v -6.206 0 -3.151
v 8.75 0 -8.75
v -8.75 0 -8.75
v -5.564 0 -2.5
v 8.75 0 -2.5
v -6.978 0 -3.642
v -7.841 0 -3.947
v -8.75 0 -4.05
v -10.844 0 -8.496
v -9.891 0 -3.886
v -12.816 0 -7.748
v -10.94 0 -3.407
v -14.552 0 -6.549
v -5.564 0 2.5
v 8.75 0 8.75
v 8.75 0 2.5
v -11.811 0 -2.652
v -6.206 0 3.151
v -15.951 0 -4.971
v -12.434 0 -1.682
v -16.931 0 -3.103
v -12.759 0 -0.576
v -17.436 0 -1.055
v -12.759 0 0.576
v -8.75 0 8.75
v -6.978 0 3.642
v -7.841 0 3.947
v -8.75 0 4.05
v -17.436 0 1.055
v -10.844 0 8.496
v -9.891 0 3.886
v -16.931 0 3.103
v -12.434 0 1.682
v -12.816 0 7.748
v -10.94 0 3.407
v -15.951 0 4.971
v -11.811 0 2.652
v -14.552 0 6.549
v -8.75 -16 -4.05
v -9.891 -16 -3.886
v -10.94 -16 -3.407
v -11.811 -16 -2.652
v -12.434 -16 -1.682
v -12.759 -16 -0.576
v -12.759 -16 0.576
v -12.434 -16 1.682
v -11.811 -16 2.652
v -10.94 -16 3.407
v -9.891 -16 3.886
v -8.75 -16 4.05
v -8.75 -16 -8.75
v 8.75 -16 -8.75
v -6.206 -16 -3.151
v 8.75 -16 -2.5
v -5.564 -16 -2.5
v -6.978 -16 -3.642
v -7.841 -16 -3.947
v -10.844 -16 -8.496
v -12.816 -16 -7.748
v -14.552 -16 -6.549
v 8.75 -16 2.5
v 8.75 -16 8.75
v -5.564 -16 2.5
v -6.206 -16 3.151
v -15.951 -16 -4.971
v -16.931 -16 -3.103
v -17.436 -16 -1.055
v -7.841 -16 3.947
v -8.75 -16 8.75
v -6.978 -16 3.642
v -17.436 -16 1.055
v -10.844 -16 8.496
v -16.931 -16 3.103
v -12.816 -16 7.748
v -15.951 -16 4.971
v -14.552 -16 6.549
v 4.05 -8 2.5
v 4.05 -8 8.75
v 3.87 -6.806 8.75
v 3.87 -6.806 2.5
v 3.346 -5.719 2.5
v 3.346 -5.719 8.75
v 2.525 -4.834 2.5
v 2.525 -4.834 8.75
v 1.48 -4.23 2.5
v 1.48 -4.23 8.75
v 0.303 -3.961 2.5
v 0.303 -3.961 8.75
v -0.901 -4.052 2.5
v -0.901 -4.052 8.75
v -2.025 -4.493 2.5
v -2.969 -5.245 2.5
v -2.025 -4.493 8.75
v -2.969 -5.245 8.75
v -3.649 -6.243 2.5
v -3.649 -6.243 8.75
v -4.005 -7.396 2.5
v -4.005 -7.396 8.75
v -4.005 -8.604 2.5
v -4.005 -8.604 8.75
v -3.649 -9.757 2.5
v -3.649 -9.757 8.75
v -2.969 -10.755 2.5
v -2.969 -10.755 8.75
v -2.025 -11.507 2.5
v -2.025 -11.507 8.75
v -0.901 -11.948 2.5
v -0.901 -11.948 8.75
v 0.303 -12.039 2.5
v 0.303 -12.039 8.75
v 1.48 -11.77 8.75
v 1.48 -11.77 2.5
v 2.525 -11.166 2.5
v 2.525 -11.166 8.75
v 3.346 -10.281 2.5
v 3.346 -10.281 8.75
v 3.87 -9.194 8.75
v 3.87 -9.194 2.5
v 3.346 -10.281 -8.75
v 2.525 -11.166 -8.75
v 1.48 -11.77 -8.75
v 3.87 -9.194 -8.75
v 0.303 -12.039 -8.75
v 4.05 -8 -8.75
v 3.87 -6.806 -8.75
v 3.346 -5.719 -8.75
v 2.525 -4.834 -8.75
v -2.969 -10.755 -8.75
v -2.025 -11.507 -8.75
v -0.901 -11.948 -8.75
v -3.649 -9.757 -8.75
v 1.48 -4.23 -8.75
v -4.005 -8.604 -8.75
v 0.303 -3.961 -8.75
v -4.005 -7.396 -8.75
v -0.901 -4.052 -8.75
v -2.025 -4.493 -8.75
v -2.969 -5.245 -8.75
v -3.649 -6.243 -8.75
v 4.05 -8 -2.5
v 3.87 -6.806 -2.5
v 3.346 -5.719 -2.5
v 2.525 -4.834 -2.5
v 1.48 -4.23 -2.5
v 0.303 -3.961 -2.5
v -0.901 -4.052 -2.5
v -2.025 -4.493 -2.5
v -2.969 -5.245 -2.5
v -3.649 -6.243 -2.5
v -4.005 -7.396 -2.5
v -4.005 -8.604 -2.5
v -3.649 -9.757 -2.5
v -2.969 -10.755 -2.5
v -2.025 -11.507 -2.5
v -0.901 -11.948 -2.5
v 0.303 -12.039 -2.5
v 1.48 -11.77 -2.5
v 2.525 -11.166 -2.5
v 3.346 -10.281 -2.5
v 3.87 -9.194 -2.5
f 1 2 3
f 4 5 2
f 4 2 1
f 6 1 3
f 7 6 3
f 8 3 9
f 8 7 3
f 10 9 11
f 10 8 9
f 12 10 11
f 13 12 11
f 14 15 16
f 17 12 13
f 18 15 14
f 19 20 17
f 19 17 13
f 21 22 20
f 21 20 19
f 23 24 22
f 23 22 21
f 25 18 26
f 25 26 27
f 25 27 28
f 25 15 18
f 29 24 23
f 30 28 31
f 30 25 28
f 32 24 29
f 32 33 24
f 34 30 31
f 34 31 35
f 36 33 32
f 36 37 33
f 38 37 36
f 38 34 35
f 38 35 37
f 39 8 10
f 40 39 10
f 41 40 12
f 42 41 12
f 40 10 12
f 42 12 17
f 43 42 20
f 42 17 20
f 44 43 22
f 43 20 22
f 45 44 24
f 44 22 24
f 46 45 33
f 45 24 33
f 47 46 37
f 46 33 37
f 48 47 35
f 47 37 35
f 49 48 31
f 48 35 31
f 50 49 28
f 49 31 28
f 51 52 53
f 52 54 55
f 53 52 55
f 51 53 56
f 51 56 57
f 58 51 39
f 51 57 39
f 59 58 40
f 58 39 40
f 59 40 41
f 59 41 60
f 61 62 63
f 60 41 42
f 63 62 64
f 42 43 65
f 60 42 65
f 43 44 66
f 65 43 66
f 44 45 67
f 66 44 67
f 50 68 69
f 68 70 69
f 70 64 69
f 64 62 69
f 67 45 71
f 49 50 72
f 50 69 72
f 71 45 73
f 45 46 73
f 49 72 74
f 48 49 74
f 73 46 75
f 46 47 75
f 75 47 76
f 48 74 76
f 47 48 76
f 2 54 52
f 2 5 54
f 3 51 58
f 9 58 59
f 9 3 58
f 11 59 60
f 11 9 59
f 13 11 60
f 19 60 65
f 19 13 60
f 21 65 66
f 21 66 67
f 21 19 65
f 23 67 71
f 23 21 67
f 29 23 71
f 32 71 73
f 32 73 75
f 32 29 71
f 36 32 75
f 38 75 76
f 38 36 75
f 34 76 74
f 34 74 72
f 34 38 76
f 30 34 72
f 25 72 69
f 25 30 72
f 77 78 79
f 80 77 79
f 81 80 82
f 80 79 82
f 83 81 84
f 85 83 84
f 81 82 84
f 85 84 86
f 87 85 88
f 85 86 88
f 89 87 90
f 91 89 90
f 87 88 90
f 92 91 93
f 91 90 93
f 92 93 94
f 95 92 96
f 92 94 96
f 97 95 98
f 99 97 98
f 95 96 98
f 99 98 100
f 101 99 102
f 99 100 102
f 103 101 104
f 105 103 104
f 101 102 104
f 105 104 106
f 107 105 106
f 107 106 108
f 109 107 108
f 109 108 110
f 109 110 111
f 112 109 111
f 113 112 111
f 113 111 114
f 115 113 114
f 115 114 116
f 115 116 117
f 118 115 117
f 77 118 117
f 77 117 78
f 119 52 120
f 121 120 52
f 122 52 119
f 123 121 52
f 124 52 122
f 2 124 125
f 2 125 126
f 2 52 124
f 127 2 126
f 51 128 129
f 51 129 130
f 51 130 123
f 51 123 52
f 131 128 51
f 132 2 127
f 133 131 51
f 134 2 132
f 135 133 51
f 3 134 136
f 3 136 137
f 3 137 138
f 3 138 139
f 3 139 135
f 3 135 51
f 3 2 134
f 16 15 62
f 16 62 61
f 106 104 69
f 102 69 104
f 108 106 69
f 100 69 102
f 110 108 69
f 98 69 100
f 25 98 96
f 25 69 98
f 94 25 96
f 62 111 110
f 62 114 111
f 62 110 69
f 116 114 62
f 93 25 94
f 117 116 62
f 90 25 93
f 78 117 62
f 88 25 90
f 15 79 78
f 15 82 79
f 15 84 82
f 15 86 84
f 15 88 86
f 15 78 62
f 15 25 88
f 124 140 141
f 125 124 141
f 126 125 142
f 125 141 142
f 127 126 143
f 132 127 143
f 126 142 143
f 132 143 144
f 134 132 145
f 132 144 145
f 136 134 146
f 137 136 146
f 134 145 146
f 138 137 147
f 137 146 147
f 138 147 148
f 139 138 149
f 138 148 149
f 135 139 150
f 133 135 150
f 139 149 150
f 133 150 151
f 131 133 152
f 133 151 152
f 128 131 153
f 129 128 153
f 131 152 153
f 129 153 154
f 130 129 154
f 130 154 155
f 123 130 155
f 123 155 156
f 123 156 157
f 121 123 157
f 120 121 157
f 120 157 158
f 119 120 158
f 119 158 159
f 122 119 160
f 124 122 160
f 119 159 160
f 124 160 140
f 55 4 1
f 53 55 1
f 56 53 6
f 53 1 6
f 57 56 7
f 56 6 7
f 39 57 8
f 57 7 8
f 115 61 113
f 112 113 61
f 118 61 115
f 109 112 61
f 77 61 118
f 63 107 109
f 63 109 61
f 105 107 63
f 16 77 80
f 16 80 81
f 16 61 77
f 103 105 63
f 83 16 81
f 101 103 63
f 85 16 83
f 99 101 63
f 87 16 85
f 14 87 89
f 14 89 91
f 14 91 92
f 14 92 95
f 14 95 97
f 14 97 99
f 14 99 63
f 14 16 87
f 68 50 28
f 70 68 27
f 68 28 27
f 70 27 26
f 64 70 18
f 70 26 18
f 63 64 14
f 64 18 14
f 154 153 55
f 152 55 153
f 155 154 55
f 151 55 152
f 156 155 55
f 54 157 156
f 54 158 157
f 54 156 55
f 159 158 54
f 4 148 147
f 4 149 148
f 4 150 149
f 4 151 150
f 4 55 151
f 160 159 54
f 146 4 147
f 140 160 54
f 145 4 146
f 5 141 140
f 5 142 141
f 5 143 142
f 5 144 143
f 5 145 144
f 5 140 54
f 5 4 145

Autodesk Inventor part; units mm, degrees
ref_plane "YZ Plane" through (0, 0, 0) normal (1, 0, 0) x (0, 1, 0)
ref_plane "XZ Plane" through (0, 0, 0) normal (0, 1, 0) x (-1, 0, 0)
ref_plane "XY Plane" through (0, 0, 0) normal (0, 0, 1) x (1, 0, 0)
sketch "Sketch1" plane through (0, 0, 0) normal (0, 1, 0) x (-1, 0, 0)
  point P0 (0, 0)
sketch "Sketch2" plane through (0, 0, 0) normal (0, 1, 0) x (-1, 0, 0)
  point P0 (0, 0)
sketch "Sketch3" plane through (0, 0, 0) normal (0, 1, 0) x (-1, 0, 0)
  line L0 (0, 0) -> (0, -8.75) construction
  line L1 (0, 0) -> (0, 8.75) construction
  line L2 (8.75, 8.75) -> (-8.75, 8.75)
  line L3 (-8.75, 8.75) -> (-8.75, -8.75)
  line L4 (-8.75, -8.75) -> (8.75, -8.75)
  line L5 (8.75, -8.75) -> (8.75, 8.75)
  circle A0 centre (8.75, 0) radius 8.75
  circle A1 centre (8.75, 0) radius 4.05
  line L6 (0, 0) -> (4.05, 0) construction
  dimension "d0" = 8.75
  dimension "d1" = 8.75
  dimension "d2" = 17.5
  dimension "d3" = 17.5
  dimension "d7" = 8.1
  dimension "d9" = 4.05
sketch "Sketch4" plane through (0, 0, 0) normal (0, 1, 0) x (-1, 0, 0)
  point P0 (0, 0)
sketch "Sketch5" plane through (0, 0, 0) normal (0, 1, 0) x (-1, 0, 0)
  point P0 (0, 0)
extrude "Extrusion2" add sketch "Sketch3" against normal blind 16 contours A0 L4 L3 L2 | A0 L5 A1 | L5 A1 A0 | L5 A1 picked at (7.639, -0.7669)
sketch "Sketch6" plane through (0, 0, 0) normal (0, 1, 0) x (1, 0, 0)
  line L0 (-8.75, 4.05) -> (-8.75, -4.05) projected
  circle A0 centre (-8.75, 0) radius 4.05
  point P0 (0, 0)
sketch "Sketch7" plane through (0, 0, 0) normal (0, 1, 0) x (1, 0, 0)
  line L0 (-8.75, 4.05) -> (-8.75, -4.05) construction
  circle A0 centre (-8.75, 0) radius 4.05 construction
  arc A1 (-8.75, 4.05) -> (-8.75, -4.05) centre (-8.75, 0) ccw construction
  arc A2 (-8.75, 8.75) -> (-8.75, -8.75) centre (-8.75, 0) ccw construction
  point P0 (0, 0)
  dimension "d12" = 8.1
extrude "Extrusion3" cut sketch "Sketch6" against normal blind 16
sketch "Sketch8" plane through (-8.75, 0, 8.75) normal (0, 0, 1) x (1, 0, 0)
  line L0 (17.5, -16) -> (0, -16) construction
  line L1 (8.75, -16) -> (8.75, 0) construction
  circle A0 centre (8.75, -8) radius 4.05
  dimension "d15" = 8.1
extrude "Extrusion4" cut sketch "Sketch8" against normal up to next
sketch "Sketch9" plane through (0, 0, 0) normal (0, 1, 0) x (1, 0, 0)
  point P0 (0, 0)
sketch "Sketch10" plane through (0, 0, 0) normal (0, 1, 0) x (1, 0, 0)
  point P0 (0, 0)
sketch "Sketch11" plane through (0, 0, 0) normal (0, 1, 0) x (1, 0, 0)
  point P0 (0, 0)
sketch "Sketch12" plane through (0, 0, 0) normal (0, 1, 0) x (1, 0, 0)
  line L0 (8.75, 8.75) -> (8.75, -8.75) construction
  line L1 (8.75, 8.75) -> (8.75, 2.5) construction
  line L2 (8.75, 2.5) -> (8.75, -2.5) construction
  line L3 (8.75, -2.5) -> (8.75, -8.75) construction
  circle A0 centre (-8.75, 0) radius 4.05 projected
  line L4 (8.75, -2.5) -> (-5.5637, -2.5)
  line L5 (-5.5637, -2.5) -> (-5.5637, 2.5)
  line L6 (-5.5637, 2.5) -> (8.75, 2.5)
  line L7 (8.75, 2.5) -> (8.75, -2.5)
  point P0 (0, 0)
  dimension "d18" = 6.25
  dimension "d19" = 5
  dimension "d20" = 6.25
extrude "Extrusion5" cut sketch "Sketch12" against normal up to next contours A0 L5 | A0 L6 L7 L4 picked at (-5.4064, -0.5793)
properties part number "base and bar clamp"
